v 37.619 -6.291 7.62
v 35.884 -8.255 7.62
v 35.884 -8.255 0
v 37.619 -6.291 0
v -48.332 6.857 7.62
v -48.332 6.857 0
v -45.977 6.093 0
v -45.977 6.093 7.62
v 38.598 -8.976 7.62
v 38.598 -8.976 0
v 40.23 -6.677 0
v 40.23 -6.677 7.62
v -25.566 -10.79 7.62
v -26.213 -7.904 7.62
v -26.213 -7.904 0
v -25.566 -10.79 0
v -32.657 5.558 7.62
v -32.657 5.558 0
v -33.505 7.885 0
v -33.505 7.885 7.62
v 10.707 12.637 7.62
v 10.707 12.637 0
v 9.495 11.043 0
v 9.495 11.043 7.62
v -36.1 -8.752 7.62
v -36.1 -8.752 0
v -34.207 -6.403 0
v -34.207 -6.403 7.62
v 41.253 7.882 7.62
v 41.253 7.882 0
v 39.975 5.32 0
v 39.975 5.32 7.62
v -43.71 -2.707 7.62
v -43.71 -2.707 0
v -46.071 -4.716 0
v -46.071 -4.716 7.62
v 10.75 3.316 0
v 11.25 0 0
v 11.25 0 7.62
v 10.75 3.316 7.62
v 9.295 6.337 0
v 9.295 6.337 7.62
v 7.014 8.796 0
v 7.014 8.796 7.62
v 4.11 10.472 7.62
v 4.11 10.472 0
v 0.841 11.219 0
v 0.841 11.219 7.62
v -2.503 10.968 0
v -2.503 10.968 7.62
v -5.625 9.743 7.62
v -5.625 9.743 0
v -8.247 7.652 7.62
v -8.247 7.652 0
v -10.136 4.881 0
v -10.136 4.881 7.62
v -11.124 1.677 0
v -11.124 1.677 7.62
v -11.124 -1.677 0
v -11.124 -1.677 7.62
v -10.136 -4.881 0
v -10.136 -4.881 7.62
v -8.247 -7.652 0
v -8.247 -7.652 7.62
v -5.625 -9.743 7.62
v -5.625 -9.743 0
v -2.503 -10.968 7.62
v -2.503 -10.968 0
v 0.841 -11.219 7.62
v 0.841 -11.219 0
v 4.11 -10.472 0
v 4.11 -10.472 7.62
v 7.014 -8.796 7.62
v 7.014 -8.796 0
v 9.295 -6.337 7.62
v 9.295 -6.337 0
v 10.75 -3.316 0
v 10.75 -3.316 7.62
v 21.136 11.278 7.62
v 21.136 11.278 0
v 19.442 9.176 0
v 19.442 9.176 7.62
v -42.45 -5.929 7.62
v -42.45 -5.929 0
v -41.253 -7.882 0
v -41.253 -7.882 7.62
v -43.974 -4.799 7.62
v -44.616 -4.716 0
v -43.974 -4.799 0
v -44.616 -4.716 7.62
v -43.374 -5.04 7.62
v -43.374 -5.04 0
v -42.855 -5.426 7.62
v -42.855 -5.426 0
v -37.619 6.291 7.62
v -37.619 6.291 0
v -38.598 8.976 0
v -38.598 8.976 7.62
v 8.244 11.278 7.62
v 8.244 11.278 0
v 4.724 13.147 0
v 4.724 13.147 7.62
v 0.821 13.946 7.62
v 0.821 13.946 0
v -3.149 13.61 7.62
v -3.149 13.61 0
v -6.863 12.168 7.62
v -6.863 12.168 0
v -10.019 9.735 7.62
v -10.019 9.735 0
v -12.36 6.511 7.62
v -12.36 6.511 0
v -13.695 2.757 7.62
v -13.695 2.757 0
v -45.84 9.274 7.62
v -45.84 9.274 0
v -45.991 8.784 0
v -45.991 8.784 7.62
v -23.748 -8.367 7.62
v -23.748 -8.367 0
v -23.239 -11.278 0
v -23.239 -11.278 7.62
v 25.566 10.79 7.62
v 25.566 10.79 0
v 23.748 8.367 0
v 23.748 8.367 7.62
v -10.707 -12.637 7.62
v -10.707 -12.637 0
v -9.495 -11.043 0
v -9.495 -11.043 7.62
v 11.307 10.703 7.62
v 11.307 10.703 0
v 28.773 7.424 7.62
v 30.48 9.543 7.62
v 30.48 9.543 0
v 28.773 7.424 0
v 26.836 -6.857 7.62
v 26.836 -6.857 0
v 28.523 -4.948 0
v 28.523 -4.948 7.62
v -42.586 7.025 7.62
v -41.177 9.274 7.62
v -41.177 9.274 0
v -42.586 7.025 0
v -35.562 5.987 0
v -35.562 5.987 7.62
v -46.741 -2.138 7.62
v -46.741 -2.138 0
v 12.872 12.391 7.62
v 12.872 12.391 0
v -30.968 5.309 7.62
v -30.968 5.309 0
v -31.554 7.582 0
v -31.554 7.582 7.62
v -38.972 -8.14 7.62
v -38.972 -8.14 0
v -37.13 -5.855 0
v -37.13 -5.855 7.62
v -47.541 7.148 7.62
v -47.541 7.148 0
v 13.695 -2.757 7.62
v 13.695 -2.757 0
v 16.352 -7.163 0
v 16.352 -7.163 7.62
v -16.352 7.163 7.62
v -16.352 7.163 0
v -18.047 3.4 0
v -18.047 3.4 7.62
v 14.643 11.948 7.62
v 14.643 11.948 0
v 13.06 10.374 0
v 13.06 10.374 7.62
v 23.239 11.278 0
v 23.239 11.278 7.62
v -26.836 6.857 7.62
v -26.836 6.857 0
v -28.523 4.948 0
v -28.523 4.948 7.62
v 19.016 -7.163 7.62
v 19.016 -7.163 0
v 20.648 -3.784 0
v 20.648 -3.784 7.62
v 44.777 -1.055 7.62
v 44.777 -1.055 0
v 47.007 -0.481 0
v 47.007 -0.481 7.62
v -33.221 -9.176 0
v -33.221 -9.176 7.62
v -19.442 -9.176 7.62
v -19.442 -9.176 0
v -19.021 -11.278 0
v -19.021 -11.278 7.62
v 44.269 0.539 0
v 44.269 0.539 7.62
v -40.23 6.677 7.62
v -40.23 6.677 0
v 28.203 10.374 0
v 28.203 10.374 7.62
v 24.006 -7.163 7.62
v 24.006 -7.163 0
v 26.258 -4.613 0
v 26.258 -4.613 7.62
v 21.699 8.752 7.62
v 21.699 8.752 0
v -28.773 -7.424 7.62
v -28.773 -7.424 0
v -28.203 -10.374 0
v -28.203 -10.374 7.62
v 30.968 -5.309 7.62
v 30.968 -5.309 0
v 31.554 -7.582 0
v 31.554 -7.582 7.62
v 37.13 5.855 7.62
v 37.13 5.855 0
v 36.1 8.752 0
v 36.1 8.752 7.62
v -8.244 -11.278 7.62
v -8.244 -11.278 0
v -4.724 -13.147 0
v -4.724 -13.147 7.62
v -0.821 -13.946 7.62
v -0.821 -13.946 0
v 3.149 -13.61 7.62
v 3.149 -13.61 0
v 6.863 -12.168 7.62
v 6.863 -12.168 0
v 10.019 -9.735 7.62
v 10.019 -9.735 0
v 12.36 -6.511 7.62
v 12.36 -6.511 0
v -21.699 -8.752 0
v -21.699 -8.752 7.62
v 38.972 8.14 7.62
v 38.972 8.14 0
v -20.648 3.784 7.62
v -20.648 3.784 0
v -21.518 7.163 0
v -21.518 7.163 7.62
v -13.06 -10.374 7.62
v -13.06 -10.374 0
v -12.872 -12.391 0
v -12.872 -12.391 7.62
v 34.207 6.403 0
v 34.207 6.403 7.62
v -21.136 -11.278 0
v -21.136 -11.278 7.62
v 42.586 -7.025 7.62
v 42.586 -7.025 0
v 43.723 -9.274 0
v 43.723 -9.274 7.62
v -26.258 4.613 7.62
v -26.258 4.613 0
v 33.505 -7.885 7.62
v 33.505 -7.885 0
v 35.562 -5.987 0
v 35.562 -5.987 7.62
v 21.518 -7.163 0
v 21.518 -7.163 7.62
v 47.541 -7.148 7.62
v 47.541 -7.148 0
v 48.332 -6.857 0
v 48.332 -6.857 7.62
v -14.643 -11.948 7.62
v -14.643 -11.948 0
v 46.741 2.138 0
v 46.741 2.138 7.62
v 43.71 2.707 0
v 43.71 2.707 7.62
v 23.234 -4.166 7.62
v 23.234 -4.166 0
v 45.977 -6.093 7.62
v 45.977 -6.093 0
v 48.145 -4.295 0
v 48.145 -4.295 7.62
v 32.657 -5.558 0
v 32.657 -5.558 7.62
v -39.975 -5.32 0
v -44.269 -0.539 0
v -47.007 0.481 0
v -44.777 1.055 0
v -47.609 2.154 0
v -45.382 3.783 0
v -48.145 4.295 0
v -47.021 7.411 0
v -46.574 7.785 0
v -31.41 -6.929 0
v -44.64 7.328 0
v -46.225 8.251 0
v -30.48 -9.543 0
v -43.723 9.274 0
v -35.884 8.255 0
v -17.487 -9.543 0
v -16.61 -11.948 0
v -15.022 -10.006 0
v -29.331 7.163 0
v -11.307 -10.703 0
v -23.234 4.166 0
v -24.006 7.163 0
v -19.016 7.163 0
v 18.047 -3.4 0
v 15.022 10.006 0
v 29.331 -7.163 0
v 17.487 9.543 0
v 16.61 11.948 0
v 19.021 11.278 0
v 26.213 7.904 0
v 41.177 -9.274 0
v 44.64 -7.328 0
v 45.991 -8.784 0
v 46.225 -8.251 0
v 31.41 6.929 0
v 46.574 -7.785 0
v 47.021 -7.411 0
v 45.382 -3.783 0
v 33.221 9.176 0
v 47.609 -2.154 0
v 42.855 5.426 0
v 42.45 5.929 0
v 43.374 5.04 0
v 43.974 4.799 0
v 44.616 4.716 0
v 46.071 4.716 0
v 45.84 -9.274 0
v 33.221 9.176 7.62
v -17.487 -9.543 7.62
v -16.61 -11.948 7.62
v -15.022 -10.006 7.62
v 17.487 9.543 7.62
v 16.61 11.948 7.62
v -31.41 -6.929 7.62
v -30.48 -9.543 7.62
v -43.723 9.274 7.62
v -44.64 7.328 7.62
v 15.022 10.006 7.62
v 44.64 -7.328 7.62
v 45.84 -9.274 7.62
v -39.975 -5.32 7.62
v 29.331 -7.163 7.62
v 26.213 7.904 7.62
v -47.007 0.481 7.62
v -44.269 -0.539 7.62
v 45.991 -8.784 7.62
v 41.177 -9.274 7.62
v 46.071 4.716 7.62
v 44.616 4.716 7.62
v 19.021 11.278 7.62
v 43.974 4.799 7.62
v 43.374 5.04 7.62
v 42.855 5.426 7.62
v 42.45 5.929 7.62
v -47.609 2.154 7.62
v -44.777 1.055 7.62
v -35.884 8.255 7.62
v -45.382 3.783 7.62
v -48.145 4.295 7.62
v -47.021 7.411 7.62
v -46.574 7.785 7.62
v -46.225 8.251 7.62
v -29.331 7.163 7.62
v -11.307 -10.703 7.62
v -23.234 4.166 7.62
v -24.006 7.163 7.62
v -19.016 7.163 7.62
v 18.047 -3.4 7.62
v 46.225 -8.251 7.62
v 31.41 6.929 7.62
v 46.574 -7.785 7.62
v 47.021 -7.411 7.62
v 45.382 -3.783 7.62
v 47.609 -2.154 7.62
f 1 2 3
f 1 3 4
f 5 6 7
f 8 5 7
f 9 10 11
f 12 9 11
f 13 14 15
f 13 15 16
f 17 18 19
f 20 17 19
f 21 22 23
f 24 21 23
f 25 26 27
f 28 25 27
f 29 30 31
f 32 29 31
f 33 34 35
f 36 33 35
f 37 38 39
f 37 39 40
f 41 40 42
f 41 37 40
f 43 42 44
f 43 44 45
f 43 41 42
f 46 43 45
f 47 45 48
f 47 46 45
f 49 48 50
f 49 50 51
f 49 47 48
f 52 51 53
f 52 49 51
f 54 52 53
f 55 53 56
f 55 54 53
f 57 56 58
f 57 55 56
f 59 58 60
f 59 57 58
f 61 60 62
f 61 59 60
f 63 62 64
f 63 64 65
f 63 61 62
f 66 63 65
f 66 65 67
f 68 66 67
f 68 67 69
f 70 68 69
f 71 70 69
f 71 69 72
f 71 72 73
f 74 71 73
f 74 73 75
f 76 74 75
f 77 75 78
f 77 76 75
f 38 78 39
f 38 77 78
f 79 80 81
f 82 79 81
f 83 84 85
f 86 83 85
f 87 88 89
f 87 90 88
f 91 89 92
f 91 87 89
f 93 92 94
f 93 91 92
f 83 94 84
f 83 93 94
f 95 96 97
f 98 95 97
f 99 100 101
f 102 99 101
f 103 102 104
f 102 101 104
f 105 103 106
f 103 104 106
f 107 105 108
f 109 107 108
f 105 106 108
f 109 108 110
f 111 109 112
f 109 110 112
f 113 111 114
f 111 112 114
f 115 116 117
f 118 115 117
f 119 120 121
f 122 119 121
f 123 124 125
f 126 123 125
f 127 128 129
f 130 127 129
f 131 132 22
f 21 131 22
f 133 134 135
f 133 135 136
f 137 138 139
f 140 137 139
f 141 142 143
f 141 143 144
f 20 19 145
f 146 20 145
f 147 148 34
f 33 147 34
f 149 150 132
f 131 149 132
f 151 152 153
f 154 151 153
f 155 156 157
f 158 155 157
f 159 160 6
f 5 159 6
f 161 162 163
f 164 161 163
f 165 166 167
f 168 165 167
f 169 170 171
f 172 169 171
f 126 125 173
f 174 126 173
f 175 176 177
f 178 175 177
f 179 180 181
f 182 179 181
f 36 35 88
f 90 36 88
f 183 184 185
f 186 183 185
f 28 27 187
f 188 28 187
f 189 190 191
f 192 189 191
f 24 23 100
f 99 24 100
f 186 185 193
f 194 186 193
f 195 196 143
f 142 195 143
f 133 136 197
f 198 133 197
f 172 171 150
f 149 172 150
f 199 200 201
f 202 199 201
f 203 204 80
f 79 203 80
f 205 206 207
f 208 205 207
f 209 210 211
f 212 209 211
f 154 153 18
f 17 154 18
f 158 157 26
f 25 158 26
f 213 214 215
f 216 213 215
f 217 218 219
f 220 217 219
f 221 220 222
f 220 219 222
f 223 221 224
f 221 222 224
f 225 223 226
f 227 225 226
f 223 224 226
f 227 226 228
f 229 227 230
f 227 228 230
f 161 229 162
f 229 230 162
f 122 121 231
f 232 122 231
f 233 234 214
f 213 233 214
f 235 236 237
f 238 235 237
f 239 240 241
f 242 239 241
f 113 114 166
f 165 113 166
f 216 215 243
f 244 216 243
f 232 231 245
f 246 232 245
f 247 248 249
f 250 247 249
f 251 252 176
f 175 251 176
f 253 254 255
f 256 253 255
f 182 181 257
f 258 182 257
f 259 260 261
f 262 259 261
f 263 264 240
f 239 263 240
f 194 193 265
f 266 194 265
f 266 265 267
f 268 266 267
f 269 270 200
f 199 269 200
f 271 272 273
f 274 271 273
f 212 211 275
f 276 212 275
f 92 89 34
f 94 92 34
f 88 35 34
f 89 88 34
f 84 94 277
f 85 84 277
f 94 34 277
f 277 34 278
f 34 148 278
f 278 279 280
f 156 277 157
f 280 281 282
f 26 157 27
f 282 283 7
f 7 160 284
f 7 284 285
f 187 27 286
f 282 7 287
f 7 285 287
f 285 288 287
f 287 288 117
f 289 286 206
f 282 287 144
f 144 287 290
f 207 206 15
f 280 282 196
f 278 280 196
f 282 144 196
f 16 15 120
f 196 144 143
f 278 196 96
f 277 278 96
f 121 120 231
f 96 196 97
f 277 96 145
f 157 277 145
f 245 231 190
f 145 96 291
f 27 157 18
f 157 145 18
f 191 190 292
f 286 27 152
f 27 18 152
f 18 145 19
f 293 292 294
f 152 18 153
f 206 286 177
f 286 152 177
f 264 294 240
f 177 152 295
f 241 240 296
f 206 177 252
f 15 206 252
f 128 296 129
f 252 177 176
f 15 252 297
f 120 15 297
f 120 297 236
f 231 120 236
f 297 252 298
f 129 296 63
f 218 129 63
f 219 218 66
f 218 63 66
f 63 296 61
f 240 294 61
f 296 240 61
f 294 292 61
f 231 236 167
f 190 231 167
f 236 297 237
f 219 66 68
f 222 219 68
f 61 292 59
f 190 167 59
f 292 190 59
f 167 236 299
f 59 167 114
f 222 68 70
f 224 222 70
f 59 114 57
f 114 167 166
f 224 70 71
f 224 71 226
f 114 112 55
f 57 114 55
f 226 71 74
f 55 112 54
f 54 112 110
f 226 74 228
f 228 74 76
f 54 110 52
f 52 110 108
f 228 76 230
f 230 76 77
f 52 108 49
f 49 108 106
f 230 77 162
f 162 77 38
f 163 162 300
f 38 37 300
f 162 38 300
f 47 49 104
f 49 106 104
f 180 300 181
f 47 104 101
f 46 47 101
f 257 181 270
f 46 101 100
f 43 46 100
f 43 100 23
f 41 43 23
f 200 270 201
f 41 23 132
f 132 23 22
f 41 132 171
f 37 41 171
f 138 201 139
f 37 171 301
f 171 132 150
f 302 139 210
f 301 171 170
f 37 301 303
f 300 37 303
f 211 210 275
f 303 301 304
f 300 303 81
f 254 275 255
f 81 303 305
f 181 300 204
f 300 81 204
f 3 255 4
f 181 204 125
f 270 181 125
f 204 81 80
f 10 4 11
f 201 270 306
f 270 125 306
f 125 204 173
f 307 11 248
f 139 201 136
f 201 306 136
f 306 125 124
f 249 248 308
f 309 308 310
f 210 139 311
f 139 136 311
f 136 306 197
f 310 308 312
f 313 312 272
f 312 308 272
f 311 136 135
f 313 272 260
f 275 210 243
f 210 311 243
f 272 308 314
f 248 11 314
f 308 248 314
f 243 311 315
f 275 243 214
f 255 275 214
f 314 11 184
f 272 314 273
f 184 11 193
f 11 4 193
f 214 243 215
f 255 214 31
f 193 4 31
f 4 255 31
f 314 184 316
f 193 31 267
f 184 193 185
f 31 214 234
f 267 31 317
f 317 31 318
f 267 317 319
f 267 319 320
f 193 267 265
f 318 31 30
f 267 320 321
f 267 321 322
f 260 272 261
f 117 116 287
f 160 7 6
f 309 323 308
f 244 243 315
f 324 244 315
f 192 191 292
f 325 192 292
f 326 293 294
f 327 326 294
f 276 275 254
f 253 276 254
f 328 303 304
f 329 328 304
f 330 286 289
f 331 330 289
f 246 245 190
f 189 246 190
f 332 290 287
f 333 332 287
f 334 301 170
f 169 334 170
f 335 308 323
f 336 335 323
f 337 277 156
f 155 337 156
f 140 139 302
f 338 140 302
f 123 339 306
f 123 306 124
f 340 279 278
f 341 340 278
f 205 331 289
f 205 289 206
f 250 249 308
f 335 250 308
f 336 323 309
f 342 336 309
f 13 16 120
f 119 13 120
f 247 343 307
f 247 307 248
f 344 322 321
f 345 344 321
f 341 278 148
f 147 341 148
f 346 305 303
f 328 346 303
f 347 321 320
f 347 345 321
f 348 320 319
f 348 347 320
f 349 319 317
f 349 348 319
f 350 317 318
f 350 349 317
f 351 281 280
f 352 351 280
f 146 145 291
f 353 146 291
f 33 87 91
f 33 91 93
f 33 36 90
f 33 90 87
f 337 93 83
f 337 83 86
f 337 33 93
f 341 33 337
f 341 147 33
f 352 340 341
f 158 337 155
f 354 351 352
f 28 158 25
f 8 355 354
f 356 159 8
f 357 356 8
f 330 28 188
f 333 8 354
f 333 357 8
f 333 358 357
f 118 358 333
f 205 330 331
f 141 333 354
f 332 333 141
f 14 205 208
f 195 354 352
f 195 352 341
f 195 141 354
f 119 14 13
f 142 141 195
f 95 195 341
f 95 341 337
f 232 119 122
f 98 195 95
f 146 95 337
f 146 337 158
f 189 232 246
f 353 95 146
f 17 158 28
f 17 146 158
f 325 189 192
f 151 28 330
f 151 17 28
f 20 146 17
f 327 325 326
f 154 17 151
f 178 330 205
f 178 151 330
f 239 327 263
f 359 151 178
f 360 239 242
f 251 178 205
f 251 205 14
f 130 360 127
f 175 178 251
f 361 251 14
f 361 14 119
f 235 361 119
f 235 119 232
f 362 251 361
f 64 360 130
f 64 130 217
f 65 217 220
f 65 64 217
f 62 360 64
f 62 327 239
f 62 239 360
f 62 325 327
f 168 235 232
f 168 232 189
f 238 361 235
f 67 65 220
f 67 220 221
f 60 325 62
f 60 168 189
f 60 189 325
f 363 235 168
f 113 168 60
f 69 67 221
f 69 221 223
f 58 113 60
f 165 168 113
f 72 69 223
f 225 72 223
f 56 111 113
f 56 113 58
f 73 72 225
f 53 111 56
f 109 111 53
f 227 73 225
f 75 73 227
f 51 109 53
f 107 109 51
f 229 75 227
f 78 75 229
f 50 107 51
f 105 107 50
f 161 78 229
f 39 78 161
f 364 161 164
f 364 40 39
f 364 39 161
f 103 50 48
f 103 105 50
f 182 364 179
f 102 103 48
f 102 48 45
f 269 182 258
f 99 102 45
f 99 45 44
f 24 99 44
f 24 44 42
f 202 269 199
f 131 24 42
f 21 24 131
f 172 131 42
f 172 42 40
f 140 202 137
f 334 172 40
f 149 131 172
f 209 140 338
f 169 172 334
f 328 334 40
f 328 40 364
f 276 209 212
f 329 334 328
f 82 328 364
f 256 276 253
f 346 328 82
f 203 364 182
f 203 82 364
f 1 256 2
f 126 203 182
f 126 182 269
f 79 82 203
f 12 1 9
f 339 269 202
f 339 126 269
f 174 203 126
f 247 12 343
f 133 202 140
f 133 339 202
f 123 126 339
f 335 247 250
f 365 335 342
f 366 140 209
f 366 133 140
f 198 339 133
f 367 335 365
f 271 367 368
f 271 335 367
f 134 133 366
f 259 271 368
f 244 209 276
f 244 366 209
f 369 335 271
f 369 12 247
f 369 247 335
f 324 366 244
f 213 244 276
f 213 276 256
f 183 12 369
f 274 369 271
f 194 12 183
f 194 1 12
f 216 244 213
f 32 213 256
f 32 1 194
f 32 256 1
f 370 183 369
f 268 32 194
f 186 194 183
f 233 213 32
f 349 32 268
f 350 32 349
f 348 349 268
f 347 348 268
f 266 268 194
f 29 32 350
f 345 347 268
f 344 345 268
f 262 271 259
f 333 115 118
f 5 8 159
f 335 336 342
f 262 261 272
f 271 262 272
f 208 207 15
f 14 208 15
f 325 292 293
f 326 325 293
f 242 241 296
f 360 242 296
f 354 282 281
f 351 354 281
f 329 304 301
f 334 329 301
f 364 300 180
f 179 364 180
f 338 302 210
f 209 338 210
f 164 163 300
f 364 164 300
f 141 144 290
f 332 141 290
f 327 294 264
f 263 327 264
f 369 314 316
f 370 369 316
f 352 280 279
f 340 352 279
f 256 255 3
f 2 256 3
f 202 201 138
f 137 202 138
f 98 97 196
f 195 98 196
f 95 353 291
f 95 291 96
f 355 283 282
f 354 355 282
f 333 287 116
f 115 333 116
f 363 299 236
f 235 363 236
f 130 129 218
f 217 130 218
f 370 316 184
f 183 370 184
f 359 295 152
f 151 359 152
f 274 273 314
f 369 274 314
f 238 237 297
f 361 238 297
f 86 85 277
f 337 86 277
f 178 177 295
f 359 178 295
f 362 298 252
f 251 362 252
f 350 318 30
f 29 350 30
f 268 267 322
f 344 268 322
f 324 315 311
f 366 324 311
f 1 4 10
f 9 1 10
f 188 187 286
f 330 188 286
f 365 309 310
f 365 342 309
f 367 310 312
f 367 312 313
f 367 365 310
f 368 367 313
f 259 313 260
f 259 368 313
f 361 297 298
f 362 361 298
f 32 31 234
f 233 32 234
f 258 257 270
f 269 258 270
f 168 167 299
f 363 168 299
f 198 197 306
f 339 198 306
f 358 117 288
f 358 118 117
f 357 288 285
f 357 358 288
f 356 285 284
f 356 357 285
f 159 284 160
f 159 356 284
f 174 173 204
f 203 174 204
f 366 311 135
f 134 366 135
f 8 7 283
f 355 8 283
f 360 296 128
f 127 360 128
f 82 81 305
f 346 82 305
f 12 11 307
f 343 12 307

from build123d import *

# Parameters (mm, degrees)
F0_R     = 11.25
F1_DEPTH = 7.62
F2_R     = 2.54


with BuildPart() as f1:
    # F0 (on Top) → F1 (new body)
    with BuildSketch(Plane.XY):
        with BuildLine():
            ThreePointArc((13.695194, -2.757274), (13.901129, -1.385467), (13.97, 0))
            ThreePointArc((13.97, 0), (12.456401, 6.324474), (8.243591, 11.27848))
            ThreePointArc((8.243591, 11.27848), (-5.057937, 13.022218), (-13.695194, 2.757274))
            ThreePointArc((-13.695194, 2.757274), (-13.022218, -5.057937), (-8.243591, -11.27848))
            ThreePointArc((-8.243591, -11.27848), (5.057937, -13.022218), (13.695194, -2.757274))
        make_face()
        Circle(F0_R, mode=Mode.SUBTRACT)
        with BuildLine():
            ThreePointArc((8.243591, 11.27848), (12.456401, 6.324474), (13.97, 0))
            ThreePointArc((13.97, 0), (13.901129, -1.385467), (13.695194, -2.757274))
            Line((13.695194, -2.757274), (18.046504, -3.400007))
            Line((18.046504, -3.400007), (20.647889, -3.784257))
            Line((20.647889, -3.784257), (23.234406, -4.166312))
            Line((23.234406, -4.166312), (26.258385, -4.612984))
            Line((26.258385, -4.612984), (28.523248, -4.947527))
            Line((28.523248, -4.947527), (30.968487, -5.308713))
            Line((30.968487, -5.308713), (32.656681, -5.558076))
            Line((32.656681, -5.558076), (35.562277, -5.987262))
            Line((35.562277, -5.987262), (37.618638, -6.291007))
            Line((37.618638, -6.291007), (40.230147, -6.676753))
            Line((40.230147, -6.676753), (42.585731, -7.024697))
            Line((42.585731, -7.024697), (44.640029, -7.328137))
            Line((44.640029, -7.328137), (46.360764, -7.582307))
            Line((46.360764, -7.582307), (45.977047, -6.092634))
            Line((45.977047, -6.092634), (45.382247, -3.783485))
            Line((45.382247, -3.783485), (44.2688, 0.539161))
            Line((44.2688, 0.539161), (43.710486, 2.706662))
            Line((43.710486, 2.706662), (43.192849, 4.716242))
            Line((43.192849, 4.716242), (39.974761, 5.320486))
            Line((39.974761, 5.320486), (37.129923, 5.854646))
            Line((37.129923, 5.854646), (34.206946, 6.403478))
            Line((34.206946, 6.403478), (31.410099, 6.928627))
            Line((31.410099, 6.928627), (28.772873, 7.423805))
            Line((28.772873, 7.423805), (26.212834, 7.90449))
            Line((26.212834, 7.90449), (23.747829, 8.367331))
            Line((23.747829, 8.367331), (21.698637, 8.752097))
            Line((21.698637, 8.752097), (19.441536, 9.175901))
            Line((19.441536, 9.175901), (17.487376, 9.542823))
            Line((17.487376, 9.542823), (15.022369, 10.005664))
            Line((15.022369, 10.005664), (13.060459, 10.374042))
            Line((13.060459, 10.374042), (11.307054, 10.70327))
            Line((11.307054, 10.70327), (9.495402, 11.043434))
            Line((9.495402, 11.043434), (8.243591, 11.27848))
        make_face()
        with BuildLine():
            ThreePointArc((-8.243591, -11.27848), (-13.022218, -5.057937), (-13.695194, 2.757274))
            Line((-13.695194, 2.757274), (-18.046504, 3.400007))
            Line((-18.046504, 3.400007), (-20.647889, 3.784257))
            Line((-20.647889, 3.784257), (-23.234406, 4.166312))
            Line((-23.234406, 4.166312), (-26.258385, 4.612984))
            Line((-26.258385, 4.612984), (-28.523248, 4.947527))
            Line((-28.523248, 4.947527), (-30.968487, 5.308713))
            Line((-30.968487, 5.308713), (-32.656681, 5.558076))
            Line((-32.656681, 5.558076), (-35.562277, 5.987262))
            Line((-35.562277, 5.987262), (-37.618638, 6.291007))
            Line((-37.618638, 6.291007), (-40.230147, 6.676753))
            Line((-40.230147, 6.676753), (-42.585731, 7.024697))
            Line((-42.585731, 7.024697), (-44.640029, 7.328137))
            Line((-44.640029, 7.328137), (-46.360764, 7.582307))
            Line((-46.360764, 7.582307), (-45.977047, 6.092634))
            Line((-45.977047, 6.092634), (-45.382247, 3.783485))
            Line((-45.382247, 3.783485), (-44.2688, -0.539161))
            Line((-44.2688, -0.539161), (-43.710486, -2.706662))
            Line((-43.710486, -2.706662), (-43.192849, -4.716242))
            Line((-43.192849, -4.716242), (-39.974761, -5.320486))
            Line((-39.974761, -5.320486), (-37.129923, -5.854646))
            Line((-37.129923, -5.854646), (-34.206946, -6.403478))
            Line((-34.206946, -6.403478), (-31.410099, -6.928627))
            Line((-31.410099, -6.928627), (-28.772873, -7.423805))
            Line((-28.772873, -7.423805), (-26.212834, -7.90449))
            Line((-26.212834, -7.90449), (-23.747829, -8.367331))
            Line((-23.747829, -8.367331), (-21.698637, -8.752097))
            Line((-21.698637, -8.752097), (-19.441536, -9.175901))
            Line((-19.441536, -9.175901), (-17.487376, -9.542823))
            Line((-17.487376, -9.542823), (-15.022369, -10.005664))
            Line((-15.022369, -10.005664), (-13.060459, -10.374042))
            Line((-13.060459, -10.374042), (-11.307054, -10.70327))
            Line((-11.307054, -10.70327), (-9.495402, -11.043434))
            Line((-9.495402, -11.043434), (-8.243591, -11.27848))
        make_face()
        Polygon((10.707353, 12.637032), (9.495402, 11.043434), (11.307054, 10.70327), align=None)
        Polygon((12.871755, 12.391077), (11.307054, 10.70327), (13.060459, 10.374042), align=None)
        Polygon((14.64263, 11.948359), (13.060459, 10.374042), (15.022369, 10.005664), align=None)
        Polygon((16.610269, 11.948359), (15.022369, 10.005664), (17.487376, 9.542823), align=None)
        Polygon((19.020624, 11.27848), (17.487376, 9.542823), (19.441536, 9.175901), align=None)
        Polygon((21.135837, 11.27848), (19.441536, 9.175901), (21.698637, 8.752097), align=None)
        Polygon((23.239078, 11.27848), (21.698637, 8.752097), (23.747829, 8.367331), align=None)
        Polygon((25.566199, 10.789929), (23.747829, 8.367331), (26.212834, 7.90449), align=None)
        Polygon((28.202849, 10.374042), (26.212834, 7.90449), (28.772873, 7.423805), align=None)
        Polygon((30.480421, 9.542823), (28.772873, 7.423805), (31.410099, 6.928627), align=None)
        Polygon((33.220999, 9.175901), (31.410099, 6.928627), (34.206946, 6.403478), align=None)
        Polygon((36.099512, 8.752097), (34.206946, 6.403478), (37.129923, 5.854646), align=None)
        Polygon((38.971896, 8.140481), (37.129923, 5.854646), (39.974761, 5.320486), align=None)
        Polygon((41.253339, 7.882453), (39.974761, 5.320486), (43.192849, 4.716242), align=None)
        Polygon((46.070598, 4.716242), (43.192849, 4.716242), (43.710486, 2.706662), align=None)
        Polygon((46.741366, 2.13757), (43.710486, 2.706662), (44.2688, 0.539161), align=None)
        Polygon((44.2688, 0.539161), (45.382247, -3.783485), (47.609445, -2.1535), (44.776806, -1.055378), (47.007285, -0.480841), align=None)
        Polygon((45.382247, -3.783485), (45.977047, -6.092634), (48.144694, -4.294504), align=None)
        Polygon((45.977047, -6.092634), (46.360764, -7.582307), (48.332162, -6.857038), align=None)
        Polygon((46.360764, -7.582307), (44.640029, -7.328137), (45.839909, -9.274097), align=None)
        Polygon((44.640029, -7.328137), (42.585731, -7.024697), (43.723498, -9.274097), align=None)
        Polygon((42.585731, -7.024697), (40.230147, -6.676753), (41.177191, -9.274097), align=None)
        Polygon((40.230147, -6.676753), (37.618638, -6.291007), (38.597815, -8.976477), align=None)
        Polygon((37.618638, -6.291007), (35.562277, -5.987262), (35.883938, -8.254709), align=None)
        Polygon((35.562277, -5.987262), (32.656681, -5.558076), (33.505198, -7.885202), align=None)
        Polygon((32.656681, -5.558076), (30.968487, -5.308713), (31.554129, -7.582307), align=None)
        Polygon((30.968487, -5.308713), (28.523248, -4.947527), (29.330876, -7.162509), align=None)
        Polygon((28.523248, -4.947527), (26.258385, -4.612984), (26.836419, -6.857038), align=None)
        Polygon((26.258385, -4.612984), (23.234406, -4.166312), (24.006179, -7.162509), align=None)
        Polygon((23.234406, -4.166312), (20.647889, -3.784257), (21.518074, -7.162509), align=None)
        Polygon((20.647889, -3.784257), (18.046504, -3.400007), (19.015666, -7.162509), align=None)
        Polygon((18.046504, -3.400007), (13.695194, -2.757274), (16.351812, -7.162509), align=None)
        Polygon((-10.707353, -12.637032), (-9.495402, -11.043434), (-11.307054, -10.70327), align=None)
        Polygon((-12.871755, -12.391077), (-11.307054, -10.70327), (-13.060459, -10.374042), align=None)
        Polygon((-14.64263, -11.948359), (-13.060459, -10.374042), (-15.022369, -10.005664), align=None)
        Polygon((-16.610269, -11.948359), (-15.022369, -10.005664), (-17.487376, -9.542823), align=None)
        Polygon((-19.020624, -11.27848), (-17.487376, -9.542823), (-19.441536, -9.175901), align=None)
        Polygon((-21.135837, -11.27848), (-19.441536, -9.175901), (-21.698637, -8.752097), align=None)
        Polygon((-23.239078, -11.27848), (-21.698637, -8.752097), (-23.747829, -8.367331), align=None)
        Polygon((-25.566199, -10.789929), (-23.747829, -8.367331), (-26.212834, -7.90449), align=None)
        Polygon((-28.202849, -10.374042), (-26.212834, -7.90449), (-28.772873, -7.423805), align=None)
        Polygon((-33.220999, -9.175901), (-31.410099, -6.928627), (-34.206946, -6.403478), align=None)
        Polygon((-38.971896, -8.140481), (-37.129923, -5.854646), (-39.974761, -5.320486), align=None)
        Polygon((-41.253339, -7.882453), (-39.974761, -5.320486), (-43.192849, -4.716242), align=None)
        Polygon((-30.480421, -9.542823), (-28.772873, -7.423805), (-31.410099, -6.928627), align=None)
        Polygon((-36.099512, -8.752097), (-34.206946, -6.403478), (-37.129923, -5.854646), align=None)
        Polygon((-46.070598, -4.716242), (-43.192849, -4.716242), (-43.710486, -2.706662), align=None)
        Polygon((-43.710486, -2.706662), (-44.2688, -0.539161), (-46.741366, -2.13757), align=None)
        Polygon((-45.382247, 3.783485), (-45.977047, 6.092634), (-48.144694, 4.294504), align=None)
        Polygon((-45.977047, 6.092634), (-46.360764, 7.582307), (-48.332162, 6.857038), align=None)
        Polygon((-46.360764, 7.582307), (-44.640029, 7.328137), (-45.839909, 9.274097), align=None)
        Polygon((-44.640029, 7.328137), (-42.585731, 7.024697), (-43.723498, 9.274097), align=None)
        Polygon((-42.585731, 7.024697), (-40.230147, 6.676753), (-41.177191, 9.274097), align=None)
        Polygon((-40.230147, 6.676753), (-37.618638, 6.291007), (-38.597815, 8.976477), align=None)
        Polygon((-37.618638, 6.291007), (-35.562277, 5.987262), (-35.883938, 8.254709), align=None)
        Polygon((-32.656681, 5.558076), (-30.968487, 5.308713), (-31.554129, 7.582307), align=None)
        Polygon((-30.968487, 5.308713), (-28.523248, 4.947527), (-29.330876, 7.162509), align=None)
        Polygon((-28.523248, 4.947527), (-26.258385, 4.612984), (-26.836419, 6.857038), align=None)
        Polygon((-44.2688, -0.539161), (-45.382247, 3.783485), (-47.609445, 2.1535), (-44.776806, 1.055378), (-47.007285, 0.480841), align=None)
        Polygon((-35.562277, 5.987262), (-32.656681, 5.558076), (-33.505198, 7.885202), align=None)
        Polygon((-26.258385, 4.612984), (-23.234406, 4.166312), (-24.006179, 7.162509), align=None)
        Polygon((-23.234406, 4.166312), (-20.647889, 3.784257), (-21.518074, 7.162509), align=None)
        Polygon((-20.647889, 3.784257), (-18.046504, 3.400007), (-19.015666, 7.162509), align=None)
        Polygon((-18.046504, 3.400007), (-13.695194, 2.757274), (-16.351812, 7.162509), align=None)
    extrude(amount=F1_DEPTH)

    # F2
    f2_edges = [f1.edges().sort_by_distance(p)[0] for p in [
        (-46.360764, 7.582307, 3.81),
        (-43.192849, -4.716242, 3.81),
        (46.360764, -7.582307, 3.81),
        (43.192849, 4.716242, 3.81),
    ]]
    fillet(f2_edges, radius=F2_R)


solid = f1.part
